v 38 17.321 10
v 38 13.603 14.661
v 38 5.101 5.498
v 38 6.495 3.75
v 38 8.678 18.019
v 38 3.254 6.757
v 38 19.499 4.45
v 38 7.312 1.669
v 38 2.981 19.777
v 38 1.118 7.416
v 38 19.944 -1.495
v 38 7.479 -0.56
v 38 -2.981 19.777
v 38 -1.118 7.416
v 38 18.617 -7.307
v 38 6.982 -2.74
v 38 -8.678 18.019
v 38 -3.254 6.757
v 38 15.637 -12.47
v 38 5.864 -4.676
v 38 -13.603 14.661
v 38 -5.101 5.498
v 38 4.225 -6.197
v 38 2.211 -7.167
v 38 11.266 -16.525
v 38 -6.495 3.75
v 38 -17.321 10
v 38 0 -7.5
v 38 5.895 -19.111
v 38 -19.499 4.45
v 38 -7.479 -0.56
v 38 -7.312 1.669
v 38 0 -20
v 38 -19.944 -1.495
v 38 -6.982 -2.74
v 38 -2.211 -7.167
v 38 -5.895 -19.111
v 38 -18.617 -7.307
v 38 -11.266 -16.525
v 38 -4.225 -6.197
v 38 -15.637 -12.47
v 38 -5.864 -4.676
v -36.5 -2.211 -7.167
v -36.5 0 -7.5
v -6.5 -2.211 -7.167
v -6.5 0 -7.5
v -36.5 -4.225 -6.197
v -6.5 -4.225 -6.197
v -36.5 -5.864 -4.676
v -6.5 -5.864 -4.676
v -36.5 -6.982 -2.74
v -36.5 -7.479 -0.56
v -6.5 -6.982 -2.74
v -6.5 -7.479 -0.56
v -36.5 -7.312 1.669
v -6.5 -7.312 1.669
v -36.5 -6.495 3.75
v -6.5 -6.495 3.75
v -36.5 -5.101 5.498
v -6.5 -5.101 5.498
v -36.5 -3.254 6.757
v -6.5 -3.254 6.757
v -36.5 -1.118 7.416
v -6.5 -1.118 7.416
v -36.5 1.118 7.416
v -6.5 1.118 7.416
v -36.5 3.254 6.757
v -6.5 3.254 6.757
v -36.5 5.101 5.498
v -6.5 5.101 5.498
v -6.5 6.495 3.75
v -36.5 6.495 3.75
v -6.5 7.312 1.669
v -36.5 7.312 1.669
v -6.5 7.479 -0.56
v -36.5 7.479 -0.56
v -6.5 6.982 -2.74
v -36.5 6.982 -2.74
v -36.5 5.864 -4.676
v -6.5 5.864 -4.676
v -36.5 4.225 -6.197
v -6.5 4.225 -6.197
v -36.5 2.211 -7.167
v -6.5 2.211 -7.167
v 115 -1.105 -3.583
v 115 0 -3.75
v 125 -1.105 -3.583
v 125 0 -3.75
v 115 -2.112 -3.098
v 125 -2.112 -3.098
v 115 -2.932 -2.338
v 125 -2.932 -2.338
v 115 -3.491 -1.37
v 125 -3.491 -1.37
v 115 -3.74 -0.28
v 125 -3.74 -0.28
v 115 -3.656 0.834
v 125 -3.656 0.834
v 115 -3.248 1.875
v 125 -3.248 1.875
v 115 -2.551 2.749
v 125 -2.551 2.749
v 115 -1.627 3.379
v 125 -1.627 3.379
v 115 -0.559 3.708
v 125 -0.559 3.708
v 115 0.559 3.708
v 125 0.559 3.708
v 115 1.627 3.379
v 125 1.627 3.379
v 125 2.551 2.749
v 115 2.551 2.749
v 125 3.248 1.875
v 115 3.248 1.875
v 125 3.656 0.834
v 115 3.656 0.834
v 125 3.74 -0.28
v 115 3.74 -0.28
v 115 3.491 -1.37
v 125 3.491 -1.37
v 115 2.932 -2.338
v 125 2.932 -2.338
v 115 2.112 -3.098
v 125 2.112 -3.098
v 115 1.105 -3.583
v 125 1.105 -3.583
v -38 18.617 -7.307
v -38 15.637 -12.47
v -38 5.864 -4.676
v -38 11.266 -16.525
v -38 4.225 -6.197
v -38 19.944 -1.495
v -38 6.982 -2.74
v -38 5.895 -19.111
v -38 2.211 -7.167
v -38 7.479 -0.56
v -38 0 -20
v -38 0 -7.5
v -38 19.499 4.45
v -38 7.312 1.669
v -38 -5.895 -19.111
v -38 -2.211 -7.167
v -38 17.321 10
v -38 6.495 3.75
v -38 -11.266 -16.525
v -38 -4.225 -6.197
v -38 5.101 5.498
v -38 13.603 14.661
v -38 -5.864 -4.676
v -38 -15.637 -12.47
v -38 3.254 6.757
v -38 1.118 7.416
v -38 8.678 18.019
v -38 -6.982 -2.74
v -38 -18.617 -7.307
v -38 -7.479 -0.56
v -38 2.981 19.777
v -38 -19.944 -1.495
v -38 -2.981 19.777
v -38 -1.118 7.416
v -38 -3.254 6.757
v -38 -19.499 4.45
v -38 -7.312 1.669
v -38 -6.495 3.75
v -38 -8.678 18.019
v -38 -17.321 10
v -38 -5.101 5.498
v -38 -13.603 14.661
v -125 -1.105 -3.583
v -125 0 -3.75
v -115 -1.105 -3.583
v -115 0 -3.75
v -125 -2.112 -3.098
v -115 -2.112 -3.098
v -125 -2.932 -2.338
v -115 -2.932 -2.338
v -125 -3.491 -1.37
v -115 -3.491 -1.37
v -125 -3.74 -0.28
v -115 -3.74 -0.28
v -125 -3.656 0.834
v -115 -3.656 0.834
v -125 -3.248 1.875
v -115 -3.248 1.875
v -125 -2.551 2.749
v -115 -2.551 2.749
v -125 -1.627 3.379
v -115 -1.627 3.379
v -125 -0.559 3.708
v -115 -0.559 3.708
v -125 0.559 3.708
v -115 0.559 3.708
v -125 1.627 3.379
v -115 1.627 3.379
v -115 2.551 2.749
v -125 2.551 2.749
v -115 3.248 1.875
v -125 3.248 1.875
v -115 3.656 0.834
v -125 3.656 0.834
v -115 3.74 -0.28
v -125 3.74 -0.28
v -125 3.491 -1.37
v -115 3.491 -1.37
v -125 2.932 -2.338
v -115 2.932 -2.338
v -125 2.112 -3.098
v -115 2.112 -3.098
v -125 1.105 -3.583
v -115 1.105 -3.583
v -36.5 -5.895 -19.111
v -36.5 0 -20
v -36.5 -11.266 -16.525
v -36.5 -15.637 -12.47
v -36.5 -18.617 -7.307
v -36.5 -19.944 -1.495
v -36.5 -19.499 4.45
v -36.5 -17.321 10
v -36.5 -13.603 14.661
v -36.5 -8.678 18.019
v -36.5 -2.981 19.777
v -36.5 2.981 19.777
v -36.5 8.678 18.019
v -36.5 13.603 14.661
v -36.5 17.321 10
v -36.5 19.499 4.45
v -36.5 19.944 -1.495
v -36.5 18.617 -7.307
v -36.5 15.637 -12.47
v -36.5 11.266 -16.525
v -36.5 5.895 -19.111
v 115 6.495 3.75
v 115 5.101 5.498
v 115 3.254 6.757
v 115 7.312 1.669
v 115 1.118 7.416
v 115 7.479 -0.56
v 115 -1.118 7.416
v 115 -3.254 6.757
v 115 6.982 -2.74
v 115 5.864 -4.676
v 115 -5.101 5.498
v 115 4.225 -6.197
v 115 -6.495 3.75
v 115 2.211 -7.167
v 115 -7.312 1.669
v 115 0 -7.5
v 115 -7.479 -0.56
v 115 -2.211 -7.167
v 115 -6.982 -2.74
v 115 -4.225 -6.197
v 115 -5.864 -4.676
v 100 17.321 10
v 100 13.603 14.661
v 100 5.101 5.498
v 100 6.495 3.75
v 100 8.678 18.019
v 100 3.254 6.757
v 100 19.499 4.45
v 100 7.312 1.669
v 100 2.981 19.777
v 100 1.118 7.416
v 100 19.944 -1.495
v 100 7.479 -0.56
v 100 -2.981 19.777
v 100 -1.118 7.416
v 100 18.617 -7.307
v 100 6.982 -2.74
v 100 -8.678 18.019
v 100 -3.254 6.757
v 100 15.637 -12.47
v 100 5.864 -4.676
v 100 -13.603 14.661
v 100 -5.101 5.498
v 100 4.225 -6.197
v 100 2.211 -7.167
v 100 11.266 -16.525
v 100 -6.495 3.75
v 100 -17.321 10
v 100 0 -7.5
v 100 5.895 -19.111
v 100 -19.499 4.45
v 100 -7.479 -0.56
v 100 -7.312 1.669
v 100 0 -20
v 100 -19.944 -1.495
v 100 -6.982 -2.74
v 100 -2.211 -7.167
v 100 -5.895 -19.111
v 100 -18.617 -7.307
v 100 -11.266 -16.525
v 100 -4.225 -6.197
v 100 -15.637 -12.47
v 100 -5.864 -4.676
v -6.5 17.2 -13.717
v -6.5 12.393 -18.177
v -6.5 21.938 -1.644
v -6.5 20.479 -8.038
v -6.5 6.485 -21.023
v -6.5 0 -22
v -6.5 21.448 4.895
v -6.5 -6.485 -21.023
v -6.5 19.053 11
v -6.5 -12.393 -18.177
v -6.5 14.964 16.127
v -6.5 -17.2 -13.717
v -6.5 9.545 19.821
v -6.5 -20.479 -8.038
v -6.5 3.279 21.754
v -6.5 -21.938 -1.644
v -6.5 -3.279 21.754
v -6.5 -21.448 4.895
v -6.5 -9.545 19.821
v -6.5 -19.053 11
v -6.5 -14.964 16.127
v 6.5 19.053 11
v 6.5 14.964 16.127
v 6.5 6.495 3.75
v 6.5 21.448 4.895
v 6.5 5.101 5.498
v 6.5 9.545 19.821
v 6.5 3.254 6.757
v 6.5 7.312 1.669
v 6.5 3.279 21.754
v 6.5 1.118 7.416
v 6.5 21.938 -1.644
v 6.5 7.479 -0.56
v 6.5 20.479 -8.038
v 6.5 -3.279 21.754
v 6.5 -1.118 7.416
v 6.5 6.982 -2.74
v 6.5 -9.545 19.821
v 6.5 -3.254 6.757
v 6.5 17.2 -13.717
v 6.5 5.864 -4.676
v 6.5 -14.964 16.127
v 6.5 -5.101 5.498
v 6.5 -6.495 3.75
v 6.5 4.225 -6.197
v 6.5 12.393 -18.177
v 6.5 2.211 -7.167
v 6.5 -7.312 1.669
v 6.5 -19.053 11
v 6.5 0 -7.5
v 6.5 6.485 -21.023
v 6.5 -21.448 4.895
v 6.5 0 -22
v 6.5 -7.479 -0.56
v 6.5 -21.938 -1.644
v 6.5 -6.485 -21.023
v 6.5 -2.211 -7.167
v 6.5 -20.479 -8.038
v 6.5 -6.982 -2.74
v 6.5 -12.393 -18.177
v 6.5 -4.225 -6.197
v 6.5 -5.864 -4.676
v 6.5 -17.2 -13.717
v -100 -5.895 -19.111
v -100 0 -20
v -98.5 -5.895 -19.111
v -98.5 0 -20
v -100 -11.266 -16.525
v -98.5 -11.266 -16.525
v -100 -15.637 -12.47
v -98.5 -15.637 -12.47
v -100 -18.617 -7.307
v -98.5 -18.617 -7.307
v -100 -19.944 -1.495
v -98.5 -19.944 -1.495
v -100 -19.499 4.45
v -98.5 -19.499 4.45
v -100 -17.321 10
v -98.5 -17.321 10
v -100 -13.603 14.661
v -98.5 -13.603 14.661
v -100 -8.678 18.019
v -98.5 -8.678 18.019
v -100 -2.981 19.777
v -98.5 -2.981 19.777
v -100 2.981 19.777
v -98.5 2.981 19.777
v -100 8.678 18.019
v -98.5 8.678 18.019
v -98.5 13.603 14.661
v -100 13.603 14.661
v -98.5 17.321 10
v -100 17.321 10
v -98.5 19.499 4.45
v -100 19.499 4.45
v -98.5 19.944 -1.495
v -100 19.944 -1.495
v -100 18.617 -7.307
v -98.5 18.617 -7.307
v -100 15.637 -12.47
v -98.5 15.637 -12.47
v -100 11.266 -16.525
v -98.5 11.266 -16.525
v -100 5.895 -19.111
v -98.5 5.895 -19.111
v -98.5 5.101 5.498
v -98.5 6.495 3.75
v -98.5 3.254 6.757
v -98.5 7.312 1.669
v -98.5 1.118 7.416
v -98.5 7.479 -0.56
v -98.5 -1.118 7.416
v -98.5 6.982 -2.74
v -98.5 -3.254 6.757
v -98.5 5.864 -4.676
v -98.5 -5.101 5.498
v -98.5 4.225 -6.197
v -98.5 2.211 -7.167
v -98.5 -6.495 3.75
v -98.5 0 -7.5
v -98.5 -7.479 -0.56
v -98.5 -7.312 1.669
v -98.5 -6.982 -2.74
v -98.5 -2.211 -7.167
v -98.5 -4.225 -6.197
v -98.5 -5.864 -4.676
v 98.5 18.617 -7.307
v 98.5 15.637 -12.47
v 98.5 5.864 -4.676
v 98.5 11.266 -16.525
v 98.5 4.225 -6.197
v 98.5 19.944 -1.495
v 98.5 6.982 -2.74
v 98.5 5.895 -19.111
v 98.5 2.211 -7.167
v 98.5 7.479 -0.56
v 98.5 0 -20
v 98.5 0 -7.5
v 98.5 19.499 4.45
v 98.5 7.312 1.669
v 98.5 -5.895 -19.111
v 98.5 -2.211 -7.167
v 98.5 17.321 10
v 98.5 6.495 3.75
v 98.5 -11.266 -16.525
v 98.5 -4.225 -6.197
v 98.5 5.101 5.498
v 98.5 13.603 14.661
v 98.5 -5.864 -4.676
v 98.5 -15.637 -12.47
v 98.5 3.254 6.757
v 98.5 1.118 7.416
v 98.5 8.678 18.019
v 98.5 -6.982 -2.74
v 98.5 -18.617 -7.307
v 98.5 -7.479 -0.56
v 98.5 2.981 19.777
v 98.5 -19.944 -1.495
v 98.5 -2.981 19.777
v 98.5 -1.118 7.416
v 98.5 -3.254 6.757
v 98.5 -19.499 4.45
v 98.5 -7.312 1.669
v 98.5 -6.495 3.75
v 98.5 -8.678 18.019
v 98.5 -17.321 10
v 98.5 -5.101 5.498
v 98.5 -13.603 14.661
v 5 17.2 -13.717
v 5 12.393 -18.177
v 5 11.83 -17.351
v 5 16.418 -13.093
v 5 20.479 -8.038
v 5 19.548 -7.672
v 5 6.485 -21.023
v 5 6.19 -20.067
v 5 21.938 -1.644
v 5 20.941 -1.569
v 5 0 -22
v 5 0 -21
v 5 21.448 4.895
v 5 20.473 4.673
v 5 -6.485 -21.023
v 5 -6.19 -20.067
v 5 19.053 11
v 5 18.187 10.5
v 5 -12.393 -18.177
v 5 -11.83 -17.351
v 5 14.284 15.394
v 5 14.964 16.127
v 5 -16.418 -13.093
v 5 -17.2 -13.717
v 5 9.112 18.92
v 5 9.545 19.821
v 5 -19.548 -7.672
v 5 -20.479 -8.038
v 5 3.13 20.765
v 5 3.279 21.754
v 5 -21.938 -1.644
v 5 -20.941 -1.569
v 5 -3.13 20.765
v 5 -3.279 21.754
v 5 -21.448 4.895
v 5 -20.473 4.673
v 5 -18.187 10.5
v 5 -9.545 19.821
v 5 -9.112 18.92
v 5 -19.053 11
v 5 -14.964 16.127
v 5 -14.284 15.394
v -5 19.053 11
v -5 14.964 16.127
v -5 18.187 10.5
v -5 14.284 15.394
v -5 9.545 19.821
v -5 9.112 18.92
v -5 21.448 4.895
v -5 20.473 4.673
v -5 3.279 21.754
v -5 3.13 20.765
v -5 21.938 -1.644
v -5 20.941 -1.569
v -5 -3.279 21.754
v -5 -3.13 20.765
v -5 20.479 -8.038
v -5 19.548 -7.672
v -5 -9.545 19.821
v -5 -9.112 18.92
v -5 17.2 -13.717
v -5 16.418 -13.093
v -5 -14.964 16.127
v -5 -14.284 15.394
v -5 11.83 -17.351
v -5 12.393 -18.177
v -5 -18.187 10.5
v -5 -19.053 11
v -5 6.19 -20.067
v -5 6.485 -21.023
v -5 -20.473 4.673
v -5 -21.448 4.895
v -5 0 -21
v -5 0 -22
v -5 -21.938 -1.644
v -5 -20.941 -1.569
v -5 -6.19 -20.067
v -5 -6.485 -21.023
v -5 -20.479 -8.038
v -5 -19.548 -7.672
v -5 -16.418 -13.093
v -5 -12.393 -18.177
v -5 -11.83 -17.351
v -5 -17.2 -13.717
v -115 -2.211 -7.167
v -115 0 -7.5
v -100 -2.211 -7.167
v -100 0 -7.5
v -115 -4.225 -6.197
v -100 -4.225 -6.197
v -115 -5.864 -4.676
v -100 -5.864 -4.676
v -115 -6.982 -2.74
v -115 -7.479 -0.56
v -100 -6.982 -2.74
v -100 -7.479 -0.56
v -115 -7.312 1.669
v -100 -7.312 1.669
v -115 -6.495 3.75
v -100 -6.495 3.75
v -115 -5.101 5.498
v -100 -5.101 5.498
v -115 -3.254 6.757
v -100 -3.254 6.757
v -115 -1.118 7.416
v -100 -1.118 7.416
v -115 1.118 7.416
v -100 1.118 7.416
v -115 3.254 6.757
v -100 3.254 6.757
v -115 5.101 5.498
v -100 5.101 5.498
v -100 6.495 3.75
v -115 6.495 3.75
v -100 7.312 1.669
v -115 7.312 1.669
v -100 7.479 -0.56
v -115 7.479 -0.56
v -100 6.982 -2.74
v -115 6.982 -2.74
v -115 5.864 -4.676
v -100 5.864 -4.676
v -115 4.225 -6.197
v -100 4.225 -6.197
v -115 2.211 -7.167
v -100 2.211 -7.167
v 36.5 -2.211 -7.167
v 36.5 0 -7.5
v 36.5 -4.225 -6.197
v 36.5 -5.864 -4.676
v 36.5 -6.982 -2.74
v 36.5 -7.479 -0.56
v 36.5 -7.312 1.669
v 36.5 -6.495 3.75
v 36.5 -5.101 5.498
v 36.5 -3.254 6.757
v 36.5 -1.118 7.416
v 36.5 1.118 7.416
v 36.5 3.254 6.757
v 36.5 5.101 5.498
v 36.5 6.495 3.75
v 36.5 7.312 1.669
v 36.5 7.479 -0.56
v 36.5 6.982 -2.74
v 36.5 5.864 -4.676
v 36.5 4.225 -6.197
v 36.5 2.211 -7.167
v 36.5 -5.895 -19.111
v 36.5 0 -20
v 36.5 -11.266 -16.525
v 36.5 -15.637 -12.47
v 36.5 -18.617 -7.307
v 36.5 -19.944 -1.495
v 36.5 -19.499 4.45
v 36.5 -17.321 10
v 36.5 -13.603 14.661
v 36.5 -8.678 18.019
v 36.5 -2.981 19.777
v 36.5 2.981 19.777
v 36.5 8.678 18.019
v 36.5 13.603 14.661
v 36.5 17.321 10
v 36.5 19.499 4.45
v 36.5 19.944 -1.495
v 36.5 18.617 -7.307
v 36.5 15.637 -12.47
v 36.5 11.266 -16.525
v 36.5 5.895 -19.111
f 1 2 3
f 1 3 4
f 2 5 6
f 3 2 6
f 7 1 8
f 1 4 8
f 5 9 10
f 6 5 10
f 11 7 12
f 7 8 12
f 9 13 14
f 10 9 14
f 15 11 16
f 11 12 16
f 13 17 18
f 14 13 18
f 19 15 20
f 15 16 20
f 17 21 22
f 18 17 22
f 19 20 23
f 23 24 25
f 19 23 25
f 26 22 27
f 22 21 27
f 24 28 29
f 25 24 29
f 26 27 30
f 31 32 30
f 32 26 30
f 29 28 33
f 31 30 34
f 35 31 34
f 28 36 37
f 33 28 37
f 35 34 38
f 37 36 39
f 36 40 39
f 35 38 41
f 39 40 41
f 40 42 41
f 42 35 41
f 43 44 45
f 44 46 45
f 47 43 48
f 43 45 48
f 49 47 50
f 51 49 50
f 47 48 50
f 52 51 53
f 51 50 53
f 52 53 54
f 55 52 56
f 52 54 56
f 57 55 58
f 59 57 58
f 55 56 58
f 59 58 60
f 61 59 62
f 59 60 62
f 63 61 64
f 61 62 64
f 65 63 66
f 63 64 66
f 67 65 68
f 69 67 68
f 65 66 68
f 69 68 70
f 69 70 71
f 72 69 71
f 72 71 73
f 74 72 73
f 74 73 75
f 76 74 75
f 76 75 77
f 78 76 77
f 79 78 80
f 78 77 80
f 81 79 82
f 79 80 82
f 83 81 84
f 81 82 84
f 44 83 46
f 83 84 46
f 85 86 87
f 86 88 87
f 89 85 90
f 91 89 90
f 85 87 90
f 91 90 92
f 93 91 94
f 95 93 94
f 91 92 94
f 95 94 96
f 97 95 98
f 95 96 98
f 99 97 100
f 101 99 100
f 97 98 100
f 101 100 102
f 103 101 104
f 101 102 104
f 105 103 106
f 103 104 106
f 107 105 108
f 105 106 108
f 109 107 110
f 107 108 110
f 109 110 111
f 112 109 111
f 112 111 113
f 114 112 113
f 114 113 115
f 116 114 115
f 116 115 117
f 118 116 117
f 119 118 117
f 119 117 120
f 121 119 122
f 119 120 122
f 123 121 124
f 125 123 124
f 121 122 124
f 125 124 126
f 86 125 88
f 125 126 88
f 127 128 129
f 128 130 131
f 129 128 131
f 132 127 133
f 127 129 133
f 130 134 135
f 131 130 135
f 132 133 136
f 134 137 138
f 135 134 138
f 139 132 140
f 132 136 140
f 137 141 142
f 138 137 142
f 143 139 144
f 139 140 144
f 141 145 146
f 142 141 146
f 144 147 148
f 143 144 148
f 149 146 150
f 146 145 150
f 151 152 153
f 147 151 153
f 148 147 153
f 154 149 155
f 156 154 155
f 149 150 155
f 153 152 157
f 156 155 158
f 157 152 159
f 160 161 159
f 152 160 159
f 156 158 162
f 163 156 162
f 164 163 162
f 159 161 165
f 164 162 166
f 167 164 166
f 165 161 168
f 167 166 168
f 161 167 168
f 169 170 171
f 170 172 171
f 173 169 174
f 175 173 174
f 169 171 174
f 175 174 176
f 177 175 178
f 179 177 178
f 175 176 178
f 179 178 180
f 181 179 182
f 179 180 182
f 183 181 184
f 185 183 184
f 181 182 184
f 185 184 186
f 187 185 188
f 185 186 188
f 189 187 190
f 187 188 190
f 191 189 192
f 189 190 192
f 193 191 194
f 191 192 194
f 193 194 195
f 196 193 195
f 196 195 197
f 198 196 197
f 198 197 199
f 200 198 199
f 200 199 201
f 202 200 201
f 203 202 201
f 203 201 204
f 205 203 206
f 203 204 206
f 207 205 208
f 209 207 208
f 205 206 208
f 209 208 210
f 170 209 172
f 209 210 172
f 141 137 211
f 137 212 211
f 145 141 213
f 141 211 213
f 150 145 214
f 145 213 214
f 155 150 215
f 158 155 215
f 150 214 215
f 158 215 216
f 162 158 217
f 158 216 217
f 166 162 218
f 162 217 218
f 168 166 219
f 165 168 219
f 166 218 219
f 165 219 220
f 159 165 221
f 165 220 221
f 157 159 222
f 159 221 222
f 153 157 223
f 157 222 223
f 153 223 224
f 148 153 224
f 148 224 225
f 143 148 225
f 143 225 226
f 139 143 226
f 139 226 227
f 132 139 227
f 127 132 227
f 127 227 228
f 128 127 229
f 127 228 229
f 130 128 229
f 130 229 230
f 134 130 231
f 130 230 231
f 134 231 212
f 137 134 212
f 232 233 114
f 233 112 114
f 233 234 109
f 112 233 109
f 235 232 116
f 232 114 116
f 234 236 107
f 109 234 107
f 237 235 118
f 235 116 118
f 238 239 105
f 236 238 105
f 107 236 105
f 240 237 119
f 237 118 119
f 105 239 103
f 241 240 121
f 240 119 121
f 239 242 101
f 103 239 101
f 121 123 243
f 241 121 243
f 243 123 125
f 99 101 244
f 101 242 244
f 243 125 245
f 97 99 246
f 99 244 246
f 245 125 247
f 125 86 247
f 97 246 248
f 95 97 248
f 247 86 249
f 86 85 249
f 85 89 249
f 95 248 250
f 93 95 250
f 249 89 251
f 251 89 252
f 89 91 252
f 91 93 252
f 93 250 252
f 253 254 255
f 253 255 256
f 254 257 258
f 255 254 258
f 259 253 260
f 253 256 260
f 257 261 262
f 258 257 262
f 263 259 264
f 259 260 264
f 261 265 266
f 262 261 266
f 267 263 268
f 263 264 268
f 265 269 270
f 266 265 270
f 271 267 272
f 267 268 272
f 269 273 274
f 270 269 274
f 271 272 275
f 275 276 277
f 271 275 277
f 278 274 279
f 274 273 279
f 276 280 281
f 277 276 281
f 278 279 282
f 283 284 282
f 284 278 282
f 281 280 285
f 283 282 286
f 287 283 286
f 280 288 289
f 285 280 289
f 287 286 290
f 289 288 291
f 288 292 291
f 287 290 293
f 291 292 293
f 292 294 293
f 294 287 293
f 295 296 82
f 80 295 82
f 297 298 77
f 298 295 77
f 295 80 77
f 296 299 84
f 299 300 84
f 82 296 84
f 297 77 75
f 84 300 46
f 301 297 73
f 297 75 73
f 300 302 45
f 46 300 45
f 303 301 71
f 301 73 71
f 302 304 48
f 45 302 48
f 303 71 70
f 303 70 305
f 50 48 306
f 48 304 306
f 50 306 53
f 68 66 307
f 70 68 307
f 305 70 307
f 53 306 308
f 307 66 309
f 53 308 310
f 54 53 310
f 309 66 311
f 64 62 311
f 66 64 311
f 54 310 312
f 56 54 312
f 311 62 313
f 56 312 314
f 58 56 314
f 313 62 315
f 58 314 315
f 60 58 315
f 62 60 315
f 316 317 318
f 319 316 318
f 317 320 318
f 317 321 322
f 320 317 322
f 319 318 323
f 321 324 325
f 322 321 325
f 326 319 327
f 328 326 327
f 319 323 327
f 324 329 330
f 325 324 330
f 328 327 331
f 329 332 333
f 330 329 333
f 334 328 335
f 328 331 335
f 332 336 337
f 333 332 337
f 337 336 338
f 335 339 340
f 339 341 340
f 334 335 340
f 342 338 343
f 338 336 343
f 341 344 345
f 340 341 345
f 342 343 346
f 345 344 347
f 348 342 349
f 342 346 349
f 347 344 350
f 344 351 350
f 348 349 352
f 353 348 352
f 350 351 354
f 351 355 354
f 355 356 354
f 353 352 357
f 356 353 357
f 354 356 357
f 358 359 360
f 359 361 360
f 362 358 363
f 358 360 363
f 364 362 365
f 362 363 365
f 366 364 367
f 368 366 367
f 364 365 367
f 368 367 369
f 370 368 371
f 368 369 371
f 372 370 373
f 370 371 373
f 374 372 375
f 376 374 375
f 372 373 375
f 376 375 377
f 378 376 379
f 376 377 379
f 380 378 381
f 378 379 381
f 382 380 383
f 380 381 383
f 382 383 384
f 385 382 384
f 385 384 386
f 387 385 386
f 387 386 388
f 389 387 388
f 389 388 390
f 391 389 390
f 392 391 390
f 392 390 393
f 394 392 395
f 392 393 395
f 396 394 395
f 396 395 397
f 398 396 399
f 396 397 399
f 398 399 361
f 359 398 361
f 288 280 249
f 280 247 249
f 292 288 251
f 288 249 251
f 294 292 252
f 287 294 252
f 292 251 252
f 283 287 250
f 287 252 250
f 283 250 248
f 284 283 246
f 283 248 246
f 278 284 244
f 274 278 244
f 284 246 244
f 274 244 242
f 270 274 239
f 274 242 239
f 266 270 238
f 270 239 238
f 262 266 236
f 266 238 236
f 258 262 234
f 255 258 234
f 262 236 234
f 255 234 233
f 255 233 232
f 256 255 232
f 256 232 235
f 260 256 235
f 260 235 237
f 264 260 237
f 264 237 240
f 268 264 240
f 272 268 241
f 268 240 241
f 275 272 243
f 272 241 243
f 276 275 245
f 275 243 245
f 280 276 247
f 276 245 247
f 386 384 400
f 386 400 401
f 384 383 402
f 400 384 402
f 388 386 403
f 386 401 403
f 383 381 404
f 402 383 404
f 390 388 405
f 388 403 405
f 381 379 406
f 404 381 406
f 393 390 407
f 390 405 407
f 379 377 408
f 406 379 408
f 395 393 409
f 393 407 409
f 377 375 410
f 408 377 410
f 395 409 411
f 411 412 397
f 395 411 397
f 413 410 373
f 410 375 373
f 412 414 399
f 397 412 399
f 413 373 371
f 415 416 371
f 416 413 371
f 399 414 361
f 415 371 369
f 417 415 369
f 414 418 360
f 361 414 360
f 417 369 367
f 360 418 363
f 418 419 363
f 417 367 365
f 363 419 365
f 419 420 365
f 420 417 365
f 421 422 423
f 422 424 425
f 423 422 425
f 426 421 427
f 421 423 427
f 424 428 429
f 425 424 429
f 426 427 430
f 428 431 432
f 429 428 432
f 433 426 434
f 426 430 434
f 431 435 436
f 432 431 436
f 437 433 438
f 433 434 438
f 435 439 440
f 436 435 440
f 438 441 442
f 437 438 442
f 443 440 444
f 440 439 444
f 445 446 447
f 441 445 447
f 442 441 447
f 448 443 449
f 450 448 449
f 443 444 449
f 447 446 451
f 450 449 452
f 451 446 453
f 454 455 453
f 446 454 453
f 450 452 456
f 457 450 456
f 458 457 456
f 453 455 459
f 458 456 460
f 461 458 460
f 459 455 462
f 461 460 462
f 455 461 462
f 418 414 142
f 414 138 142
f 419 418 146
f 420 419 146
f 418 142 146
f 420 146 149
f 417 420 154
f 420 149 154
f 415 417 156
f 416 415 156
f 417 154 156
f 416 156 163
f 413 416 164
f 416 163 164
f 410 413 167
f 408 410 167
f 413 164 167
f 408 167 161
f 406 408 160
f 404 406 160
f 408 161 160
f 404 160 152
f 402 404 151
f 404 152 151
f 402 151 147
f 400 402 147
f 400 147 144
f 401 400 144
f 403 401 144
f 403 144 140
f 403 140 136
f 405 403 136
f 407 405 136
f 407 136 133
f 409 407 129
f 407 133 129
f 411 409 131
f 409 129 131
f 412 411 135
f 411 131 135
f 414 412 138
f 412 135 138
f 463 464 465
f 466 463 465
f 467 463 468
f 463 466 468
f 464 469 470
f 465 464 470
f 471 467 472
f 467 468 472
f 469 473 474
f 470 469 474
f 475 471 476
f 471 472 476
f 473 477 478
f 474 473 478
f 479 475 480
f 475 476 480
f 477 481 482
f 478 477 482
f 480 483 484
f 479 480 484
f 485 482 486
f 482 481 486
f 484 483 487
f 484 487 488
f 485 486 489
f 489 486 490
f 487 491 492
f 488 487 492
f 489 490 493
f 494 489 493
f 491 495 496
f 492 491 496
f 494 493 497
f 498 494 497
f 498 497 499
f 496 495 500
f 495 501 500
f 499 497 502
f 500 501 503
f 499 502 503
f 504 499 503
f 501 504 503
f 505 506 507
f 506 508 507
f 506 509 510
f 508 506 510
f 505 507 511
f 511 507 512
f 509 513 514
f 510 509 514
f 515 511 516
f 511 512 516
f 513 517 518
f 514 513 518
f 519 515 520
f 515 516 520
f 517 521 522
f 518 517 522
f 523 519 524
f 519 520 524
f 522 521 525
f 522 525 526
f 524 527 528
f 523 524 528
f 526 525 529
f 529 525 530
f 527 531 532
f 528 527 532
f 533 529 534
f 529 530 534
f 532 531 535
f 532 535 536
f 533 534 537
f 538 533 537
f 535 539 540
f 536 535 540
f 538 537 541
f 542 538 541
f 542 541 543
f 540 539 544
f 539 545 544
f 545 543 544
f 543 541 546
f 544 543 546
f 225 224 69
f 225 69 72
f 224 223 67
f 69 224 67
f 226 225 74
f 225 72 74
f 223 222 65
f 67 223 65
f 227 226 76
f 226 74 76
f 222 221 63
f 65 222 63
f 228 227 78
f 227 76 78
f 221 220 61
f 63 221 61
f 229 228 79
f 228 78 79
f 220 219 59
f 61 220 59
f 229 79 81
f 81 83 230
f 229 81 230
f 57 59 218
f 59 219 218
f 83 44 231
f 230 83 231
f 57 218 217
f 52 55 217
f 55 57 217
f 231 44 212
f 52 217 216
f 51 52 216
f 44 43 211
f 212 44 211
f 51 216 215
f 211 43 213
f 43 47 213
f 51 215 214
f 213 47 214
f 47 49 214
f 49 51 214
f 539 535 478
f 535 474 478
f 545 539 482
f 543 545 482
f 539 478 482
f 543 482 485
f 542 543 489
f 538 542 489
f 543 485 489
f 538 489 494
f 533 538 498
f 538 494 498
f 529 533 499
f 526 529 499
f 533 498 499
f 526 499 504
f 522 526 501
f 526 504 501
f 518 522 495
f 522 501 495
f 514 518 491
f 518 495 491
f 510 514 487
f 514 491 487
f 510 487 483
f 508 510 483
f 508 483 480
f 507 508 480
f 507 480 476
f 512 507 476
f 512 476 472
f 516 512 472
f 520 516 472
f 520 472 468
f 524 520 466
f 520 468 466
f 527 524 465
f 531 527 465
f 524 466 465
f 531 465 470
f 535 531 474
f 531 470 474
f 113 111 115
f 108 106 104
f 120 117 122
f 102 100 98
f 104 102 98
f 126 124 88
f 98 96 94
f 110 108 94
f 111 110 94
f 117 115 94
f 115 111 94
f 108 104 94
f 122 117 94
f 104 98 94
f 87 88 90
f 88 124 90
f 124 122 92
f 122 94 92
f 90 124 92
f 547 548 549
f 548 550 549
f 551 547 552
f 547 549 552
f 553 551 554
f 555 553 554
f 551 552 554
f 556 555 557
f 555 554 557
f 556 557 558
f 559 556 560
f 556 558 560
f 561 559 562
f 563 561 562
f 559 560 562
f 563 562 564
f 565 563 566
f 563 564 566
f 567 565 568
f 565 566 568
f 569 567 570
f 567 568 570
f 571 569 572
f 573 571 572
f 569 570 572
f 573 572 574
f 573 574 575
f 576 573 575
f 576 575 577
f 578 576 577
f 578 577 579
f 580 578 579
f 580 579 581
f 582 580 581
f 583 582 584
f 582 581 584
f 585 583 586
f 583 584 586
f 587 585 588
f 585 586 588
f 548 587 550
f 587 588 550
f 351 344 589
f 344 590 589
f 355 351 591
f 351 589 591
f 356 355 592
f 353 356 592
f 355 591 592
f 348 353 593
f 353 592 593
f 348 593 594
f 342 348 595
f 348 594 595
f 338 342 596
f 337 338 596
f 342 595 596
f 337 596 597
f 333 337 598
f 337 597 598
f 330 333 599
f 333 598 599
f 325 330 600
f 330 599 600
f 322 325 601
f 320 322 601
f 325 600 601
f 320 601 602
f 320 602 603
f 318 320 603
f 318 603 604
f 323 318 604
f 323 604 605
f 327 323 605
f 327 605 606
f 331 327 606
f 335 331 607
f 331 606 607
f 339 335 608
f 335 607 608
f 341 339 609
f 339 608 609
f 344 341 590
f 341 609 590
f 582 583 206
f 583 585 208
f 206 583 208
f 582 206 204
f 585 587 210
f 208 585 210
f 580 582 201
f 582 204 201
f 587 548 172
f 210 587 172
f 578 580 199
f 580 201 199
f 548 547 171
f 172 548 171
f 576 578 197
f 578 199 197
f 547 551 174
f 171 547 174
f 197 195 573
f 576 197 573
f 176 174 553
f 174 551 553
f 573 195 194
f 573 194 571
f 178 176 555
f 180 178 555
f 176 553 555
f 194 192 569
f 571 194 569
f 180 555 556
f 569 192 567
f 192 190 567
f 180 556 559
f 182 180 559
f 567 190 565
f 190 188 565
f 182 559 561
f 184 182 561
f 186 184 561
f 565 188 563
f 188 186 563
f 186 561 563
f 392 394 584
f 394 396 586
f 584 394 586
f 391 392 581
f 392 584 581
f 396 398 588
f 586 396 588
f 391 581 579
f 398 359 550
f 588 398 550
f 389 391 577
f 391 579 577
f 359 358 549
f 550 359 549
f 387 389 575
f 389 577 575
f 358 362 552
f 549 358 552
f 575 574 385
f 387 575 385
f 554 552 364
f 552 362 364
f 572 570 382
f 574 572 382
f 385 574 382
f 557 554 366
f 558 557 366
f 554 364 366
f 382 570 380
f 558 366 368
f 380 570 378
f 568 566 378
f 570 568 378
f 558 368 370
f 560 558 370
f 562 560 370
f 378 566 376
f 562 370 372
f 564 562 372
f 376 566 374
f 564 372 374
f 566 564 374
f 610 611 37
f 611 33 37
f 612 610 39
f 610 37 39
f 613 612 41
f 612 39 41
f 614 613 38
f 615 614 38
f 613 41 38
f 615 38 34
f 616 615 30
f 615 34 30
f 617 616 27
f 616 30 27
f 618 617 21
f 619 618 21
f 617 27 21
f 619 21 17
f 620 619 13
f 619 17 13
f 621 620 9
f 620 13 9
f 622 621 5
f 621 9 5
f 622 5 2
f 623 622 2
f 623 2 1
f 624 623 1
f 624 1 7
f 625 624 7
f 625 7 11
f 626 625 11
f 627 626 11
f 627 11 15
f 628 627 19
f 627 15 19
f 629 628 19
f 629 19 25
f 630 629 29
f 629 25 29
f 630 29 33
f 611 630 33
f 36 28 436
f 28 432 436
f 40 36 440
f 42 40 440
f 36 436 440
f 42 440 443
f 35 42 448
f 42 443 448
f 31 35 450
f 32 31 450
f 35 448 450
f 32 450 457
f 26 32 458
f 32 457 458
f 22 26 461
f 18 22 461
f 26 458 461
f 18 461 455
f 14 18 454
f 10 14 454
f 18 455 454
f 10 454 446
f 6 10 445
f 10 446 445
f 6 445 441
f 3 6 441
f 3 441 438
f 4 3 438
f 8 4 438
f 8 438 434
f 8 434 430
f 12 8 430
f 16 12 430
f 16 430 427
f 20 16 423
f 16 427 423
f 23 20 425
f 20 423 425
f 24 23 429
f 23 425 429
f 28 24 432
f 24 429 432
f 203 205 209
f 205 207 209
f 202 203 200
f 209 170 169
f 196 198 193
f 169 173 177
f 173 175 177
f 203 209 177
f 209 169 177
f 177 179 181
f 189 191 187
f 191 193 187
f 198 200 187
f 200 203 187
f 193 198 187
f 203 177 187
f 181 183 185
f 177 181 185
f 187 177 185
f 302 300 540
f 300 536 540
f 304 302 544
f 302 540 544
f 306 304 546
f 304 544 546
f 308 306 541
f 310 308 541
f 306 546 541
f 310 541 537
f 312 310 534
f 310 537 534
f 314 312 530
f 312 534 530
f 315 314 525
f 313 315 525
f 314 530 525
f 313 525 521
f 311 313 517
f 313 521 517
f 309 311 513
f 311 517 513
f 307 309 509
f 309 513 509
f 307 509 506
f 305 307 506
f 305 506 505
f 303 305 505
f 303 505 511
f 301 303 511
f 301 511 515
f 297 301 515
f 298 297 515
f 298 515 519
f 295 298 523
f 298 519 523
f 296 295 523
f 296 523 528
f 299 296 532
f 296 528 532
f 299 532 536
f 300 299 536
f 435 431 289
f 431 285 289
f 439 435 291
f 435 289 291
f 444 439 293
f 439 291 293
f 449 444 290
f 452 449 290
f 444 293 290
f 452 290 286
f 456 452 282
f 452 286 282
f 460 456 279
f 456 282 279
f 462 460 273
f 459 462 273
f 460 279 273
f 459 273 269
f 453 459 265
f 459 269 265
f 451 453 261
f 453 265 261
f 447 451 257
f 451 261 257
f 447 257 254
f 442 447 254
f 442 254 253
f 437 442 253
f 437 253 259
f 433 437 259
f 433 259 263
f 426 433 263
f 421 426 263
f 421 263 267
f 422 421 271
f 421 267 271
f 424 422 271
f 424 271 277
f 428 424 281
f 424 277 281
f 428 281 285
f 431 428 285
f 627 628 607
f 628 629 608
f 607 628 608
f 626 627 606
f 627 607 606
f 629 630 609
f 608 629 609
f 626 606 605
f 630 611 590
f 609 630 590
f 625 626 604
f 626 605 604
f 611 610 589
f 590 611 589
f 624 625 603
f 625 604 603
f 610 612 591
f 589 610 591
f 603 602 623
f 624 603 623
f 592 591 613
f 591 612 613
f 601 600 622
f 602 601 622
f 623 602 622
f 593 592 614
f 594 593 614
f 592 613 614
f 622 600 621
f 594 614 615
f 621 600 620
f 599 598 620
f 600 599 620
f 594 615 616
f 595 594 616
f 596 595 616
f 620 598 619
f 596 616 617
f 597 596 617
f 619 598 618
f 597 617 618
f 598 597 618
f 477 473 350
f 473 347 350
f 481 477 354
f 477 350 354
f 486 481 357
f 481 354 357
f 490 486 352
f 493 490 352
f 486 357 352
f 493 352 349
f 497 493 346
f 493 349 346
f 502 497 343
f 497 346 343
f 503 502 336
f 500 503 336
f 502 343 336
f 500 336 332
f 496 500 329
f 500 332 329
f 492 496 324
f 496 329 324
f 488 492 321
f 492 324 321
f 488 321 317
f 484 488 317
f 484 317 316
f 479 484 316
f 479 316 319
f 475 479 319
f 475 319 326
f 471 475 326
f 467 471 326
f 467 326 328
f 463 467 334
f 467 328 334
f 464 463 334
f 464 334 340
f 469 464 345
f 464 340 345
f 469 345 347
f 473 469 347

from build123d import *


with BuildPart() as part:
    # Sketch1 → Revolve1 (revolve)
    with BuildSketch(Plane.XY, mode=Mode.PRIVATE) as revolve1_sk:
        Polygon((-125, 0), (-125, 3.75), (-115, 3.75), (-115, 7.5), (-100, 7.5), (-100, 20), (-98.5, 20), (-98.5, 7.5), (-38, 7.5), (-38, 20), (-36.5, 20), (-36.5, 7.5), (-6.5, 7.5), (-6.5, 22), (-5, 22), (-5, 21), (5, 21), (5, 22), (6.5, 22), (6.5, 7.5), (36.5, 7.5), (36.5, 20), (38, 20), (38, 7.5), (98.5, 7.5), (98.5, 20), (100, 20), (100, 7.5), (115, 7.5), (115, 3.75), (125, 3.75), (125, 0), align=None)
    revolve(revolve1_sk.sketch.rotate(Axis((-7.951807229, 0, 0), (-1, 0, 0)), 90), axis=Axis((-7.951807229, 0, 0), (-1, 0, 0)))


solid = part.part
